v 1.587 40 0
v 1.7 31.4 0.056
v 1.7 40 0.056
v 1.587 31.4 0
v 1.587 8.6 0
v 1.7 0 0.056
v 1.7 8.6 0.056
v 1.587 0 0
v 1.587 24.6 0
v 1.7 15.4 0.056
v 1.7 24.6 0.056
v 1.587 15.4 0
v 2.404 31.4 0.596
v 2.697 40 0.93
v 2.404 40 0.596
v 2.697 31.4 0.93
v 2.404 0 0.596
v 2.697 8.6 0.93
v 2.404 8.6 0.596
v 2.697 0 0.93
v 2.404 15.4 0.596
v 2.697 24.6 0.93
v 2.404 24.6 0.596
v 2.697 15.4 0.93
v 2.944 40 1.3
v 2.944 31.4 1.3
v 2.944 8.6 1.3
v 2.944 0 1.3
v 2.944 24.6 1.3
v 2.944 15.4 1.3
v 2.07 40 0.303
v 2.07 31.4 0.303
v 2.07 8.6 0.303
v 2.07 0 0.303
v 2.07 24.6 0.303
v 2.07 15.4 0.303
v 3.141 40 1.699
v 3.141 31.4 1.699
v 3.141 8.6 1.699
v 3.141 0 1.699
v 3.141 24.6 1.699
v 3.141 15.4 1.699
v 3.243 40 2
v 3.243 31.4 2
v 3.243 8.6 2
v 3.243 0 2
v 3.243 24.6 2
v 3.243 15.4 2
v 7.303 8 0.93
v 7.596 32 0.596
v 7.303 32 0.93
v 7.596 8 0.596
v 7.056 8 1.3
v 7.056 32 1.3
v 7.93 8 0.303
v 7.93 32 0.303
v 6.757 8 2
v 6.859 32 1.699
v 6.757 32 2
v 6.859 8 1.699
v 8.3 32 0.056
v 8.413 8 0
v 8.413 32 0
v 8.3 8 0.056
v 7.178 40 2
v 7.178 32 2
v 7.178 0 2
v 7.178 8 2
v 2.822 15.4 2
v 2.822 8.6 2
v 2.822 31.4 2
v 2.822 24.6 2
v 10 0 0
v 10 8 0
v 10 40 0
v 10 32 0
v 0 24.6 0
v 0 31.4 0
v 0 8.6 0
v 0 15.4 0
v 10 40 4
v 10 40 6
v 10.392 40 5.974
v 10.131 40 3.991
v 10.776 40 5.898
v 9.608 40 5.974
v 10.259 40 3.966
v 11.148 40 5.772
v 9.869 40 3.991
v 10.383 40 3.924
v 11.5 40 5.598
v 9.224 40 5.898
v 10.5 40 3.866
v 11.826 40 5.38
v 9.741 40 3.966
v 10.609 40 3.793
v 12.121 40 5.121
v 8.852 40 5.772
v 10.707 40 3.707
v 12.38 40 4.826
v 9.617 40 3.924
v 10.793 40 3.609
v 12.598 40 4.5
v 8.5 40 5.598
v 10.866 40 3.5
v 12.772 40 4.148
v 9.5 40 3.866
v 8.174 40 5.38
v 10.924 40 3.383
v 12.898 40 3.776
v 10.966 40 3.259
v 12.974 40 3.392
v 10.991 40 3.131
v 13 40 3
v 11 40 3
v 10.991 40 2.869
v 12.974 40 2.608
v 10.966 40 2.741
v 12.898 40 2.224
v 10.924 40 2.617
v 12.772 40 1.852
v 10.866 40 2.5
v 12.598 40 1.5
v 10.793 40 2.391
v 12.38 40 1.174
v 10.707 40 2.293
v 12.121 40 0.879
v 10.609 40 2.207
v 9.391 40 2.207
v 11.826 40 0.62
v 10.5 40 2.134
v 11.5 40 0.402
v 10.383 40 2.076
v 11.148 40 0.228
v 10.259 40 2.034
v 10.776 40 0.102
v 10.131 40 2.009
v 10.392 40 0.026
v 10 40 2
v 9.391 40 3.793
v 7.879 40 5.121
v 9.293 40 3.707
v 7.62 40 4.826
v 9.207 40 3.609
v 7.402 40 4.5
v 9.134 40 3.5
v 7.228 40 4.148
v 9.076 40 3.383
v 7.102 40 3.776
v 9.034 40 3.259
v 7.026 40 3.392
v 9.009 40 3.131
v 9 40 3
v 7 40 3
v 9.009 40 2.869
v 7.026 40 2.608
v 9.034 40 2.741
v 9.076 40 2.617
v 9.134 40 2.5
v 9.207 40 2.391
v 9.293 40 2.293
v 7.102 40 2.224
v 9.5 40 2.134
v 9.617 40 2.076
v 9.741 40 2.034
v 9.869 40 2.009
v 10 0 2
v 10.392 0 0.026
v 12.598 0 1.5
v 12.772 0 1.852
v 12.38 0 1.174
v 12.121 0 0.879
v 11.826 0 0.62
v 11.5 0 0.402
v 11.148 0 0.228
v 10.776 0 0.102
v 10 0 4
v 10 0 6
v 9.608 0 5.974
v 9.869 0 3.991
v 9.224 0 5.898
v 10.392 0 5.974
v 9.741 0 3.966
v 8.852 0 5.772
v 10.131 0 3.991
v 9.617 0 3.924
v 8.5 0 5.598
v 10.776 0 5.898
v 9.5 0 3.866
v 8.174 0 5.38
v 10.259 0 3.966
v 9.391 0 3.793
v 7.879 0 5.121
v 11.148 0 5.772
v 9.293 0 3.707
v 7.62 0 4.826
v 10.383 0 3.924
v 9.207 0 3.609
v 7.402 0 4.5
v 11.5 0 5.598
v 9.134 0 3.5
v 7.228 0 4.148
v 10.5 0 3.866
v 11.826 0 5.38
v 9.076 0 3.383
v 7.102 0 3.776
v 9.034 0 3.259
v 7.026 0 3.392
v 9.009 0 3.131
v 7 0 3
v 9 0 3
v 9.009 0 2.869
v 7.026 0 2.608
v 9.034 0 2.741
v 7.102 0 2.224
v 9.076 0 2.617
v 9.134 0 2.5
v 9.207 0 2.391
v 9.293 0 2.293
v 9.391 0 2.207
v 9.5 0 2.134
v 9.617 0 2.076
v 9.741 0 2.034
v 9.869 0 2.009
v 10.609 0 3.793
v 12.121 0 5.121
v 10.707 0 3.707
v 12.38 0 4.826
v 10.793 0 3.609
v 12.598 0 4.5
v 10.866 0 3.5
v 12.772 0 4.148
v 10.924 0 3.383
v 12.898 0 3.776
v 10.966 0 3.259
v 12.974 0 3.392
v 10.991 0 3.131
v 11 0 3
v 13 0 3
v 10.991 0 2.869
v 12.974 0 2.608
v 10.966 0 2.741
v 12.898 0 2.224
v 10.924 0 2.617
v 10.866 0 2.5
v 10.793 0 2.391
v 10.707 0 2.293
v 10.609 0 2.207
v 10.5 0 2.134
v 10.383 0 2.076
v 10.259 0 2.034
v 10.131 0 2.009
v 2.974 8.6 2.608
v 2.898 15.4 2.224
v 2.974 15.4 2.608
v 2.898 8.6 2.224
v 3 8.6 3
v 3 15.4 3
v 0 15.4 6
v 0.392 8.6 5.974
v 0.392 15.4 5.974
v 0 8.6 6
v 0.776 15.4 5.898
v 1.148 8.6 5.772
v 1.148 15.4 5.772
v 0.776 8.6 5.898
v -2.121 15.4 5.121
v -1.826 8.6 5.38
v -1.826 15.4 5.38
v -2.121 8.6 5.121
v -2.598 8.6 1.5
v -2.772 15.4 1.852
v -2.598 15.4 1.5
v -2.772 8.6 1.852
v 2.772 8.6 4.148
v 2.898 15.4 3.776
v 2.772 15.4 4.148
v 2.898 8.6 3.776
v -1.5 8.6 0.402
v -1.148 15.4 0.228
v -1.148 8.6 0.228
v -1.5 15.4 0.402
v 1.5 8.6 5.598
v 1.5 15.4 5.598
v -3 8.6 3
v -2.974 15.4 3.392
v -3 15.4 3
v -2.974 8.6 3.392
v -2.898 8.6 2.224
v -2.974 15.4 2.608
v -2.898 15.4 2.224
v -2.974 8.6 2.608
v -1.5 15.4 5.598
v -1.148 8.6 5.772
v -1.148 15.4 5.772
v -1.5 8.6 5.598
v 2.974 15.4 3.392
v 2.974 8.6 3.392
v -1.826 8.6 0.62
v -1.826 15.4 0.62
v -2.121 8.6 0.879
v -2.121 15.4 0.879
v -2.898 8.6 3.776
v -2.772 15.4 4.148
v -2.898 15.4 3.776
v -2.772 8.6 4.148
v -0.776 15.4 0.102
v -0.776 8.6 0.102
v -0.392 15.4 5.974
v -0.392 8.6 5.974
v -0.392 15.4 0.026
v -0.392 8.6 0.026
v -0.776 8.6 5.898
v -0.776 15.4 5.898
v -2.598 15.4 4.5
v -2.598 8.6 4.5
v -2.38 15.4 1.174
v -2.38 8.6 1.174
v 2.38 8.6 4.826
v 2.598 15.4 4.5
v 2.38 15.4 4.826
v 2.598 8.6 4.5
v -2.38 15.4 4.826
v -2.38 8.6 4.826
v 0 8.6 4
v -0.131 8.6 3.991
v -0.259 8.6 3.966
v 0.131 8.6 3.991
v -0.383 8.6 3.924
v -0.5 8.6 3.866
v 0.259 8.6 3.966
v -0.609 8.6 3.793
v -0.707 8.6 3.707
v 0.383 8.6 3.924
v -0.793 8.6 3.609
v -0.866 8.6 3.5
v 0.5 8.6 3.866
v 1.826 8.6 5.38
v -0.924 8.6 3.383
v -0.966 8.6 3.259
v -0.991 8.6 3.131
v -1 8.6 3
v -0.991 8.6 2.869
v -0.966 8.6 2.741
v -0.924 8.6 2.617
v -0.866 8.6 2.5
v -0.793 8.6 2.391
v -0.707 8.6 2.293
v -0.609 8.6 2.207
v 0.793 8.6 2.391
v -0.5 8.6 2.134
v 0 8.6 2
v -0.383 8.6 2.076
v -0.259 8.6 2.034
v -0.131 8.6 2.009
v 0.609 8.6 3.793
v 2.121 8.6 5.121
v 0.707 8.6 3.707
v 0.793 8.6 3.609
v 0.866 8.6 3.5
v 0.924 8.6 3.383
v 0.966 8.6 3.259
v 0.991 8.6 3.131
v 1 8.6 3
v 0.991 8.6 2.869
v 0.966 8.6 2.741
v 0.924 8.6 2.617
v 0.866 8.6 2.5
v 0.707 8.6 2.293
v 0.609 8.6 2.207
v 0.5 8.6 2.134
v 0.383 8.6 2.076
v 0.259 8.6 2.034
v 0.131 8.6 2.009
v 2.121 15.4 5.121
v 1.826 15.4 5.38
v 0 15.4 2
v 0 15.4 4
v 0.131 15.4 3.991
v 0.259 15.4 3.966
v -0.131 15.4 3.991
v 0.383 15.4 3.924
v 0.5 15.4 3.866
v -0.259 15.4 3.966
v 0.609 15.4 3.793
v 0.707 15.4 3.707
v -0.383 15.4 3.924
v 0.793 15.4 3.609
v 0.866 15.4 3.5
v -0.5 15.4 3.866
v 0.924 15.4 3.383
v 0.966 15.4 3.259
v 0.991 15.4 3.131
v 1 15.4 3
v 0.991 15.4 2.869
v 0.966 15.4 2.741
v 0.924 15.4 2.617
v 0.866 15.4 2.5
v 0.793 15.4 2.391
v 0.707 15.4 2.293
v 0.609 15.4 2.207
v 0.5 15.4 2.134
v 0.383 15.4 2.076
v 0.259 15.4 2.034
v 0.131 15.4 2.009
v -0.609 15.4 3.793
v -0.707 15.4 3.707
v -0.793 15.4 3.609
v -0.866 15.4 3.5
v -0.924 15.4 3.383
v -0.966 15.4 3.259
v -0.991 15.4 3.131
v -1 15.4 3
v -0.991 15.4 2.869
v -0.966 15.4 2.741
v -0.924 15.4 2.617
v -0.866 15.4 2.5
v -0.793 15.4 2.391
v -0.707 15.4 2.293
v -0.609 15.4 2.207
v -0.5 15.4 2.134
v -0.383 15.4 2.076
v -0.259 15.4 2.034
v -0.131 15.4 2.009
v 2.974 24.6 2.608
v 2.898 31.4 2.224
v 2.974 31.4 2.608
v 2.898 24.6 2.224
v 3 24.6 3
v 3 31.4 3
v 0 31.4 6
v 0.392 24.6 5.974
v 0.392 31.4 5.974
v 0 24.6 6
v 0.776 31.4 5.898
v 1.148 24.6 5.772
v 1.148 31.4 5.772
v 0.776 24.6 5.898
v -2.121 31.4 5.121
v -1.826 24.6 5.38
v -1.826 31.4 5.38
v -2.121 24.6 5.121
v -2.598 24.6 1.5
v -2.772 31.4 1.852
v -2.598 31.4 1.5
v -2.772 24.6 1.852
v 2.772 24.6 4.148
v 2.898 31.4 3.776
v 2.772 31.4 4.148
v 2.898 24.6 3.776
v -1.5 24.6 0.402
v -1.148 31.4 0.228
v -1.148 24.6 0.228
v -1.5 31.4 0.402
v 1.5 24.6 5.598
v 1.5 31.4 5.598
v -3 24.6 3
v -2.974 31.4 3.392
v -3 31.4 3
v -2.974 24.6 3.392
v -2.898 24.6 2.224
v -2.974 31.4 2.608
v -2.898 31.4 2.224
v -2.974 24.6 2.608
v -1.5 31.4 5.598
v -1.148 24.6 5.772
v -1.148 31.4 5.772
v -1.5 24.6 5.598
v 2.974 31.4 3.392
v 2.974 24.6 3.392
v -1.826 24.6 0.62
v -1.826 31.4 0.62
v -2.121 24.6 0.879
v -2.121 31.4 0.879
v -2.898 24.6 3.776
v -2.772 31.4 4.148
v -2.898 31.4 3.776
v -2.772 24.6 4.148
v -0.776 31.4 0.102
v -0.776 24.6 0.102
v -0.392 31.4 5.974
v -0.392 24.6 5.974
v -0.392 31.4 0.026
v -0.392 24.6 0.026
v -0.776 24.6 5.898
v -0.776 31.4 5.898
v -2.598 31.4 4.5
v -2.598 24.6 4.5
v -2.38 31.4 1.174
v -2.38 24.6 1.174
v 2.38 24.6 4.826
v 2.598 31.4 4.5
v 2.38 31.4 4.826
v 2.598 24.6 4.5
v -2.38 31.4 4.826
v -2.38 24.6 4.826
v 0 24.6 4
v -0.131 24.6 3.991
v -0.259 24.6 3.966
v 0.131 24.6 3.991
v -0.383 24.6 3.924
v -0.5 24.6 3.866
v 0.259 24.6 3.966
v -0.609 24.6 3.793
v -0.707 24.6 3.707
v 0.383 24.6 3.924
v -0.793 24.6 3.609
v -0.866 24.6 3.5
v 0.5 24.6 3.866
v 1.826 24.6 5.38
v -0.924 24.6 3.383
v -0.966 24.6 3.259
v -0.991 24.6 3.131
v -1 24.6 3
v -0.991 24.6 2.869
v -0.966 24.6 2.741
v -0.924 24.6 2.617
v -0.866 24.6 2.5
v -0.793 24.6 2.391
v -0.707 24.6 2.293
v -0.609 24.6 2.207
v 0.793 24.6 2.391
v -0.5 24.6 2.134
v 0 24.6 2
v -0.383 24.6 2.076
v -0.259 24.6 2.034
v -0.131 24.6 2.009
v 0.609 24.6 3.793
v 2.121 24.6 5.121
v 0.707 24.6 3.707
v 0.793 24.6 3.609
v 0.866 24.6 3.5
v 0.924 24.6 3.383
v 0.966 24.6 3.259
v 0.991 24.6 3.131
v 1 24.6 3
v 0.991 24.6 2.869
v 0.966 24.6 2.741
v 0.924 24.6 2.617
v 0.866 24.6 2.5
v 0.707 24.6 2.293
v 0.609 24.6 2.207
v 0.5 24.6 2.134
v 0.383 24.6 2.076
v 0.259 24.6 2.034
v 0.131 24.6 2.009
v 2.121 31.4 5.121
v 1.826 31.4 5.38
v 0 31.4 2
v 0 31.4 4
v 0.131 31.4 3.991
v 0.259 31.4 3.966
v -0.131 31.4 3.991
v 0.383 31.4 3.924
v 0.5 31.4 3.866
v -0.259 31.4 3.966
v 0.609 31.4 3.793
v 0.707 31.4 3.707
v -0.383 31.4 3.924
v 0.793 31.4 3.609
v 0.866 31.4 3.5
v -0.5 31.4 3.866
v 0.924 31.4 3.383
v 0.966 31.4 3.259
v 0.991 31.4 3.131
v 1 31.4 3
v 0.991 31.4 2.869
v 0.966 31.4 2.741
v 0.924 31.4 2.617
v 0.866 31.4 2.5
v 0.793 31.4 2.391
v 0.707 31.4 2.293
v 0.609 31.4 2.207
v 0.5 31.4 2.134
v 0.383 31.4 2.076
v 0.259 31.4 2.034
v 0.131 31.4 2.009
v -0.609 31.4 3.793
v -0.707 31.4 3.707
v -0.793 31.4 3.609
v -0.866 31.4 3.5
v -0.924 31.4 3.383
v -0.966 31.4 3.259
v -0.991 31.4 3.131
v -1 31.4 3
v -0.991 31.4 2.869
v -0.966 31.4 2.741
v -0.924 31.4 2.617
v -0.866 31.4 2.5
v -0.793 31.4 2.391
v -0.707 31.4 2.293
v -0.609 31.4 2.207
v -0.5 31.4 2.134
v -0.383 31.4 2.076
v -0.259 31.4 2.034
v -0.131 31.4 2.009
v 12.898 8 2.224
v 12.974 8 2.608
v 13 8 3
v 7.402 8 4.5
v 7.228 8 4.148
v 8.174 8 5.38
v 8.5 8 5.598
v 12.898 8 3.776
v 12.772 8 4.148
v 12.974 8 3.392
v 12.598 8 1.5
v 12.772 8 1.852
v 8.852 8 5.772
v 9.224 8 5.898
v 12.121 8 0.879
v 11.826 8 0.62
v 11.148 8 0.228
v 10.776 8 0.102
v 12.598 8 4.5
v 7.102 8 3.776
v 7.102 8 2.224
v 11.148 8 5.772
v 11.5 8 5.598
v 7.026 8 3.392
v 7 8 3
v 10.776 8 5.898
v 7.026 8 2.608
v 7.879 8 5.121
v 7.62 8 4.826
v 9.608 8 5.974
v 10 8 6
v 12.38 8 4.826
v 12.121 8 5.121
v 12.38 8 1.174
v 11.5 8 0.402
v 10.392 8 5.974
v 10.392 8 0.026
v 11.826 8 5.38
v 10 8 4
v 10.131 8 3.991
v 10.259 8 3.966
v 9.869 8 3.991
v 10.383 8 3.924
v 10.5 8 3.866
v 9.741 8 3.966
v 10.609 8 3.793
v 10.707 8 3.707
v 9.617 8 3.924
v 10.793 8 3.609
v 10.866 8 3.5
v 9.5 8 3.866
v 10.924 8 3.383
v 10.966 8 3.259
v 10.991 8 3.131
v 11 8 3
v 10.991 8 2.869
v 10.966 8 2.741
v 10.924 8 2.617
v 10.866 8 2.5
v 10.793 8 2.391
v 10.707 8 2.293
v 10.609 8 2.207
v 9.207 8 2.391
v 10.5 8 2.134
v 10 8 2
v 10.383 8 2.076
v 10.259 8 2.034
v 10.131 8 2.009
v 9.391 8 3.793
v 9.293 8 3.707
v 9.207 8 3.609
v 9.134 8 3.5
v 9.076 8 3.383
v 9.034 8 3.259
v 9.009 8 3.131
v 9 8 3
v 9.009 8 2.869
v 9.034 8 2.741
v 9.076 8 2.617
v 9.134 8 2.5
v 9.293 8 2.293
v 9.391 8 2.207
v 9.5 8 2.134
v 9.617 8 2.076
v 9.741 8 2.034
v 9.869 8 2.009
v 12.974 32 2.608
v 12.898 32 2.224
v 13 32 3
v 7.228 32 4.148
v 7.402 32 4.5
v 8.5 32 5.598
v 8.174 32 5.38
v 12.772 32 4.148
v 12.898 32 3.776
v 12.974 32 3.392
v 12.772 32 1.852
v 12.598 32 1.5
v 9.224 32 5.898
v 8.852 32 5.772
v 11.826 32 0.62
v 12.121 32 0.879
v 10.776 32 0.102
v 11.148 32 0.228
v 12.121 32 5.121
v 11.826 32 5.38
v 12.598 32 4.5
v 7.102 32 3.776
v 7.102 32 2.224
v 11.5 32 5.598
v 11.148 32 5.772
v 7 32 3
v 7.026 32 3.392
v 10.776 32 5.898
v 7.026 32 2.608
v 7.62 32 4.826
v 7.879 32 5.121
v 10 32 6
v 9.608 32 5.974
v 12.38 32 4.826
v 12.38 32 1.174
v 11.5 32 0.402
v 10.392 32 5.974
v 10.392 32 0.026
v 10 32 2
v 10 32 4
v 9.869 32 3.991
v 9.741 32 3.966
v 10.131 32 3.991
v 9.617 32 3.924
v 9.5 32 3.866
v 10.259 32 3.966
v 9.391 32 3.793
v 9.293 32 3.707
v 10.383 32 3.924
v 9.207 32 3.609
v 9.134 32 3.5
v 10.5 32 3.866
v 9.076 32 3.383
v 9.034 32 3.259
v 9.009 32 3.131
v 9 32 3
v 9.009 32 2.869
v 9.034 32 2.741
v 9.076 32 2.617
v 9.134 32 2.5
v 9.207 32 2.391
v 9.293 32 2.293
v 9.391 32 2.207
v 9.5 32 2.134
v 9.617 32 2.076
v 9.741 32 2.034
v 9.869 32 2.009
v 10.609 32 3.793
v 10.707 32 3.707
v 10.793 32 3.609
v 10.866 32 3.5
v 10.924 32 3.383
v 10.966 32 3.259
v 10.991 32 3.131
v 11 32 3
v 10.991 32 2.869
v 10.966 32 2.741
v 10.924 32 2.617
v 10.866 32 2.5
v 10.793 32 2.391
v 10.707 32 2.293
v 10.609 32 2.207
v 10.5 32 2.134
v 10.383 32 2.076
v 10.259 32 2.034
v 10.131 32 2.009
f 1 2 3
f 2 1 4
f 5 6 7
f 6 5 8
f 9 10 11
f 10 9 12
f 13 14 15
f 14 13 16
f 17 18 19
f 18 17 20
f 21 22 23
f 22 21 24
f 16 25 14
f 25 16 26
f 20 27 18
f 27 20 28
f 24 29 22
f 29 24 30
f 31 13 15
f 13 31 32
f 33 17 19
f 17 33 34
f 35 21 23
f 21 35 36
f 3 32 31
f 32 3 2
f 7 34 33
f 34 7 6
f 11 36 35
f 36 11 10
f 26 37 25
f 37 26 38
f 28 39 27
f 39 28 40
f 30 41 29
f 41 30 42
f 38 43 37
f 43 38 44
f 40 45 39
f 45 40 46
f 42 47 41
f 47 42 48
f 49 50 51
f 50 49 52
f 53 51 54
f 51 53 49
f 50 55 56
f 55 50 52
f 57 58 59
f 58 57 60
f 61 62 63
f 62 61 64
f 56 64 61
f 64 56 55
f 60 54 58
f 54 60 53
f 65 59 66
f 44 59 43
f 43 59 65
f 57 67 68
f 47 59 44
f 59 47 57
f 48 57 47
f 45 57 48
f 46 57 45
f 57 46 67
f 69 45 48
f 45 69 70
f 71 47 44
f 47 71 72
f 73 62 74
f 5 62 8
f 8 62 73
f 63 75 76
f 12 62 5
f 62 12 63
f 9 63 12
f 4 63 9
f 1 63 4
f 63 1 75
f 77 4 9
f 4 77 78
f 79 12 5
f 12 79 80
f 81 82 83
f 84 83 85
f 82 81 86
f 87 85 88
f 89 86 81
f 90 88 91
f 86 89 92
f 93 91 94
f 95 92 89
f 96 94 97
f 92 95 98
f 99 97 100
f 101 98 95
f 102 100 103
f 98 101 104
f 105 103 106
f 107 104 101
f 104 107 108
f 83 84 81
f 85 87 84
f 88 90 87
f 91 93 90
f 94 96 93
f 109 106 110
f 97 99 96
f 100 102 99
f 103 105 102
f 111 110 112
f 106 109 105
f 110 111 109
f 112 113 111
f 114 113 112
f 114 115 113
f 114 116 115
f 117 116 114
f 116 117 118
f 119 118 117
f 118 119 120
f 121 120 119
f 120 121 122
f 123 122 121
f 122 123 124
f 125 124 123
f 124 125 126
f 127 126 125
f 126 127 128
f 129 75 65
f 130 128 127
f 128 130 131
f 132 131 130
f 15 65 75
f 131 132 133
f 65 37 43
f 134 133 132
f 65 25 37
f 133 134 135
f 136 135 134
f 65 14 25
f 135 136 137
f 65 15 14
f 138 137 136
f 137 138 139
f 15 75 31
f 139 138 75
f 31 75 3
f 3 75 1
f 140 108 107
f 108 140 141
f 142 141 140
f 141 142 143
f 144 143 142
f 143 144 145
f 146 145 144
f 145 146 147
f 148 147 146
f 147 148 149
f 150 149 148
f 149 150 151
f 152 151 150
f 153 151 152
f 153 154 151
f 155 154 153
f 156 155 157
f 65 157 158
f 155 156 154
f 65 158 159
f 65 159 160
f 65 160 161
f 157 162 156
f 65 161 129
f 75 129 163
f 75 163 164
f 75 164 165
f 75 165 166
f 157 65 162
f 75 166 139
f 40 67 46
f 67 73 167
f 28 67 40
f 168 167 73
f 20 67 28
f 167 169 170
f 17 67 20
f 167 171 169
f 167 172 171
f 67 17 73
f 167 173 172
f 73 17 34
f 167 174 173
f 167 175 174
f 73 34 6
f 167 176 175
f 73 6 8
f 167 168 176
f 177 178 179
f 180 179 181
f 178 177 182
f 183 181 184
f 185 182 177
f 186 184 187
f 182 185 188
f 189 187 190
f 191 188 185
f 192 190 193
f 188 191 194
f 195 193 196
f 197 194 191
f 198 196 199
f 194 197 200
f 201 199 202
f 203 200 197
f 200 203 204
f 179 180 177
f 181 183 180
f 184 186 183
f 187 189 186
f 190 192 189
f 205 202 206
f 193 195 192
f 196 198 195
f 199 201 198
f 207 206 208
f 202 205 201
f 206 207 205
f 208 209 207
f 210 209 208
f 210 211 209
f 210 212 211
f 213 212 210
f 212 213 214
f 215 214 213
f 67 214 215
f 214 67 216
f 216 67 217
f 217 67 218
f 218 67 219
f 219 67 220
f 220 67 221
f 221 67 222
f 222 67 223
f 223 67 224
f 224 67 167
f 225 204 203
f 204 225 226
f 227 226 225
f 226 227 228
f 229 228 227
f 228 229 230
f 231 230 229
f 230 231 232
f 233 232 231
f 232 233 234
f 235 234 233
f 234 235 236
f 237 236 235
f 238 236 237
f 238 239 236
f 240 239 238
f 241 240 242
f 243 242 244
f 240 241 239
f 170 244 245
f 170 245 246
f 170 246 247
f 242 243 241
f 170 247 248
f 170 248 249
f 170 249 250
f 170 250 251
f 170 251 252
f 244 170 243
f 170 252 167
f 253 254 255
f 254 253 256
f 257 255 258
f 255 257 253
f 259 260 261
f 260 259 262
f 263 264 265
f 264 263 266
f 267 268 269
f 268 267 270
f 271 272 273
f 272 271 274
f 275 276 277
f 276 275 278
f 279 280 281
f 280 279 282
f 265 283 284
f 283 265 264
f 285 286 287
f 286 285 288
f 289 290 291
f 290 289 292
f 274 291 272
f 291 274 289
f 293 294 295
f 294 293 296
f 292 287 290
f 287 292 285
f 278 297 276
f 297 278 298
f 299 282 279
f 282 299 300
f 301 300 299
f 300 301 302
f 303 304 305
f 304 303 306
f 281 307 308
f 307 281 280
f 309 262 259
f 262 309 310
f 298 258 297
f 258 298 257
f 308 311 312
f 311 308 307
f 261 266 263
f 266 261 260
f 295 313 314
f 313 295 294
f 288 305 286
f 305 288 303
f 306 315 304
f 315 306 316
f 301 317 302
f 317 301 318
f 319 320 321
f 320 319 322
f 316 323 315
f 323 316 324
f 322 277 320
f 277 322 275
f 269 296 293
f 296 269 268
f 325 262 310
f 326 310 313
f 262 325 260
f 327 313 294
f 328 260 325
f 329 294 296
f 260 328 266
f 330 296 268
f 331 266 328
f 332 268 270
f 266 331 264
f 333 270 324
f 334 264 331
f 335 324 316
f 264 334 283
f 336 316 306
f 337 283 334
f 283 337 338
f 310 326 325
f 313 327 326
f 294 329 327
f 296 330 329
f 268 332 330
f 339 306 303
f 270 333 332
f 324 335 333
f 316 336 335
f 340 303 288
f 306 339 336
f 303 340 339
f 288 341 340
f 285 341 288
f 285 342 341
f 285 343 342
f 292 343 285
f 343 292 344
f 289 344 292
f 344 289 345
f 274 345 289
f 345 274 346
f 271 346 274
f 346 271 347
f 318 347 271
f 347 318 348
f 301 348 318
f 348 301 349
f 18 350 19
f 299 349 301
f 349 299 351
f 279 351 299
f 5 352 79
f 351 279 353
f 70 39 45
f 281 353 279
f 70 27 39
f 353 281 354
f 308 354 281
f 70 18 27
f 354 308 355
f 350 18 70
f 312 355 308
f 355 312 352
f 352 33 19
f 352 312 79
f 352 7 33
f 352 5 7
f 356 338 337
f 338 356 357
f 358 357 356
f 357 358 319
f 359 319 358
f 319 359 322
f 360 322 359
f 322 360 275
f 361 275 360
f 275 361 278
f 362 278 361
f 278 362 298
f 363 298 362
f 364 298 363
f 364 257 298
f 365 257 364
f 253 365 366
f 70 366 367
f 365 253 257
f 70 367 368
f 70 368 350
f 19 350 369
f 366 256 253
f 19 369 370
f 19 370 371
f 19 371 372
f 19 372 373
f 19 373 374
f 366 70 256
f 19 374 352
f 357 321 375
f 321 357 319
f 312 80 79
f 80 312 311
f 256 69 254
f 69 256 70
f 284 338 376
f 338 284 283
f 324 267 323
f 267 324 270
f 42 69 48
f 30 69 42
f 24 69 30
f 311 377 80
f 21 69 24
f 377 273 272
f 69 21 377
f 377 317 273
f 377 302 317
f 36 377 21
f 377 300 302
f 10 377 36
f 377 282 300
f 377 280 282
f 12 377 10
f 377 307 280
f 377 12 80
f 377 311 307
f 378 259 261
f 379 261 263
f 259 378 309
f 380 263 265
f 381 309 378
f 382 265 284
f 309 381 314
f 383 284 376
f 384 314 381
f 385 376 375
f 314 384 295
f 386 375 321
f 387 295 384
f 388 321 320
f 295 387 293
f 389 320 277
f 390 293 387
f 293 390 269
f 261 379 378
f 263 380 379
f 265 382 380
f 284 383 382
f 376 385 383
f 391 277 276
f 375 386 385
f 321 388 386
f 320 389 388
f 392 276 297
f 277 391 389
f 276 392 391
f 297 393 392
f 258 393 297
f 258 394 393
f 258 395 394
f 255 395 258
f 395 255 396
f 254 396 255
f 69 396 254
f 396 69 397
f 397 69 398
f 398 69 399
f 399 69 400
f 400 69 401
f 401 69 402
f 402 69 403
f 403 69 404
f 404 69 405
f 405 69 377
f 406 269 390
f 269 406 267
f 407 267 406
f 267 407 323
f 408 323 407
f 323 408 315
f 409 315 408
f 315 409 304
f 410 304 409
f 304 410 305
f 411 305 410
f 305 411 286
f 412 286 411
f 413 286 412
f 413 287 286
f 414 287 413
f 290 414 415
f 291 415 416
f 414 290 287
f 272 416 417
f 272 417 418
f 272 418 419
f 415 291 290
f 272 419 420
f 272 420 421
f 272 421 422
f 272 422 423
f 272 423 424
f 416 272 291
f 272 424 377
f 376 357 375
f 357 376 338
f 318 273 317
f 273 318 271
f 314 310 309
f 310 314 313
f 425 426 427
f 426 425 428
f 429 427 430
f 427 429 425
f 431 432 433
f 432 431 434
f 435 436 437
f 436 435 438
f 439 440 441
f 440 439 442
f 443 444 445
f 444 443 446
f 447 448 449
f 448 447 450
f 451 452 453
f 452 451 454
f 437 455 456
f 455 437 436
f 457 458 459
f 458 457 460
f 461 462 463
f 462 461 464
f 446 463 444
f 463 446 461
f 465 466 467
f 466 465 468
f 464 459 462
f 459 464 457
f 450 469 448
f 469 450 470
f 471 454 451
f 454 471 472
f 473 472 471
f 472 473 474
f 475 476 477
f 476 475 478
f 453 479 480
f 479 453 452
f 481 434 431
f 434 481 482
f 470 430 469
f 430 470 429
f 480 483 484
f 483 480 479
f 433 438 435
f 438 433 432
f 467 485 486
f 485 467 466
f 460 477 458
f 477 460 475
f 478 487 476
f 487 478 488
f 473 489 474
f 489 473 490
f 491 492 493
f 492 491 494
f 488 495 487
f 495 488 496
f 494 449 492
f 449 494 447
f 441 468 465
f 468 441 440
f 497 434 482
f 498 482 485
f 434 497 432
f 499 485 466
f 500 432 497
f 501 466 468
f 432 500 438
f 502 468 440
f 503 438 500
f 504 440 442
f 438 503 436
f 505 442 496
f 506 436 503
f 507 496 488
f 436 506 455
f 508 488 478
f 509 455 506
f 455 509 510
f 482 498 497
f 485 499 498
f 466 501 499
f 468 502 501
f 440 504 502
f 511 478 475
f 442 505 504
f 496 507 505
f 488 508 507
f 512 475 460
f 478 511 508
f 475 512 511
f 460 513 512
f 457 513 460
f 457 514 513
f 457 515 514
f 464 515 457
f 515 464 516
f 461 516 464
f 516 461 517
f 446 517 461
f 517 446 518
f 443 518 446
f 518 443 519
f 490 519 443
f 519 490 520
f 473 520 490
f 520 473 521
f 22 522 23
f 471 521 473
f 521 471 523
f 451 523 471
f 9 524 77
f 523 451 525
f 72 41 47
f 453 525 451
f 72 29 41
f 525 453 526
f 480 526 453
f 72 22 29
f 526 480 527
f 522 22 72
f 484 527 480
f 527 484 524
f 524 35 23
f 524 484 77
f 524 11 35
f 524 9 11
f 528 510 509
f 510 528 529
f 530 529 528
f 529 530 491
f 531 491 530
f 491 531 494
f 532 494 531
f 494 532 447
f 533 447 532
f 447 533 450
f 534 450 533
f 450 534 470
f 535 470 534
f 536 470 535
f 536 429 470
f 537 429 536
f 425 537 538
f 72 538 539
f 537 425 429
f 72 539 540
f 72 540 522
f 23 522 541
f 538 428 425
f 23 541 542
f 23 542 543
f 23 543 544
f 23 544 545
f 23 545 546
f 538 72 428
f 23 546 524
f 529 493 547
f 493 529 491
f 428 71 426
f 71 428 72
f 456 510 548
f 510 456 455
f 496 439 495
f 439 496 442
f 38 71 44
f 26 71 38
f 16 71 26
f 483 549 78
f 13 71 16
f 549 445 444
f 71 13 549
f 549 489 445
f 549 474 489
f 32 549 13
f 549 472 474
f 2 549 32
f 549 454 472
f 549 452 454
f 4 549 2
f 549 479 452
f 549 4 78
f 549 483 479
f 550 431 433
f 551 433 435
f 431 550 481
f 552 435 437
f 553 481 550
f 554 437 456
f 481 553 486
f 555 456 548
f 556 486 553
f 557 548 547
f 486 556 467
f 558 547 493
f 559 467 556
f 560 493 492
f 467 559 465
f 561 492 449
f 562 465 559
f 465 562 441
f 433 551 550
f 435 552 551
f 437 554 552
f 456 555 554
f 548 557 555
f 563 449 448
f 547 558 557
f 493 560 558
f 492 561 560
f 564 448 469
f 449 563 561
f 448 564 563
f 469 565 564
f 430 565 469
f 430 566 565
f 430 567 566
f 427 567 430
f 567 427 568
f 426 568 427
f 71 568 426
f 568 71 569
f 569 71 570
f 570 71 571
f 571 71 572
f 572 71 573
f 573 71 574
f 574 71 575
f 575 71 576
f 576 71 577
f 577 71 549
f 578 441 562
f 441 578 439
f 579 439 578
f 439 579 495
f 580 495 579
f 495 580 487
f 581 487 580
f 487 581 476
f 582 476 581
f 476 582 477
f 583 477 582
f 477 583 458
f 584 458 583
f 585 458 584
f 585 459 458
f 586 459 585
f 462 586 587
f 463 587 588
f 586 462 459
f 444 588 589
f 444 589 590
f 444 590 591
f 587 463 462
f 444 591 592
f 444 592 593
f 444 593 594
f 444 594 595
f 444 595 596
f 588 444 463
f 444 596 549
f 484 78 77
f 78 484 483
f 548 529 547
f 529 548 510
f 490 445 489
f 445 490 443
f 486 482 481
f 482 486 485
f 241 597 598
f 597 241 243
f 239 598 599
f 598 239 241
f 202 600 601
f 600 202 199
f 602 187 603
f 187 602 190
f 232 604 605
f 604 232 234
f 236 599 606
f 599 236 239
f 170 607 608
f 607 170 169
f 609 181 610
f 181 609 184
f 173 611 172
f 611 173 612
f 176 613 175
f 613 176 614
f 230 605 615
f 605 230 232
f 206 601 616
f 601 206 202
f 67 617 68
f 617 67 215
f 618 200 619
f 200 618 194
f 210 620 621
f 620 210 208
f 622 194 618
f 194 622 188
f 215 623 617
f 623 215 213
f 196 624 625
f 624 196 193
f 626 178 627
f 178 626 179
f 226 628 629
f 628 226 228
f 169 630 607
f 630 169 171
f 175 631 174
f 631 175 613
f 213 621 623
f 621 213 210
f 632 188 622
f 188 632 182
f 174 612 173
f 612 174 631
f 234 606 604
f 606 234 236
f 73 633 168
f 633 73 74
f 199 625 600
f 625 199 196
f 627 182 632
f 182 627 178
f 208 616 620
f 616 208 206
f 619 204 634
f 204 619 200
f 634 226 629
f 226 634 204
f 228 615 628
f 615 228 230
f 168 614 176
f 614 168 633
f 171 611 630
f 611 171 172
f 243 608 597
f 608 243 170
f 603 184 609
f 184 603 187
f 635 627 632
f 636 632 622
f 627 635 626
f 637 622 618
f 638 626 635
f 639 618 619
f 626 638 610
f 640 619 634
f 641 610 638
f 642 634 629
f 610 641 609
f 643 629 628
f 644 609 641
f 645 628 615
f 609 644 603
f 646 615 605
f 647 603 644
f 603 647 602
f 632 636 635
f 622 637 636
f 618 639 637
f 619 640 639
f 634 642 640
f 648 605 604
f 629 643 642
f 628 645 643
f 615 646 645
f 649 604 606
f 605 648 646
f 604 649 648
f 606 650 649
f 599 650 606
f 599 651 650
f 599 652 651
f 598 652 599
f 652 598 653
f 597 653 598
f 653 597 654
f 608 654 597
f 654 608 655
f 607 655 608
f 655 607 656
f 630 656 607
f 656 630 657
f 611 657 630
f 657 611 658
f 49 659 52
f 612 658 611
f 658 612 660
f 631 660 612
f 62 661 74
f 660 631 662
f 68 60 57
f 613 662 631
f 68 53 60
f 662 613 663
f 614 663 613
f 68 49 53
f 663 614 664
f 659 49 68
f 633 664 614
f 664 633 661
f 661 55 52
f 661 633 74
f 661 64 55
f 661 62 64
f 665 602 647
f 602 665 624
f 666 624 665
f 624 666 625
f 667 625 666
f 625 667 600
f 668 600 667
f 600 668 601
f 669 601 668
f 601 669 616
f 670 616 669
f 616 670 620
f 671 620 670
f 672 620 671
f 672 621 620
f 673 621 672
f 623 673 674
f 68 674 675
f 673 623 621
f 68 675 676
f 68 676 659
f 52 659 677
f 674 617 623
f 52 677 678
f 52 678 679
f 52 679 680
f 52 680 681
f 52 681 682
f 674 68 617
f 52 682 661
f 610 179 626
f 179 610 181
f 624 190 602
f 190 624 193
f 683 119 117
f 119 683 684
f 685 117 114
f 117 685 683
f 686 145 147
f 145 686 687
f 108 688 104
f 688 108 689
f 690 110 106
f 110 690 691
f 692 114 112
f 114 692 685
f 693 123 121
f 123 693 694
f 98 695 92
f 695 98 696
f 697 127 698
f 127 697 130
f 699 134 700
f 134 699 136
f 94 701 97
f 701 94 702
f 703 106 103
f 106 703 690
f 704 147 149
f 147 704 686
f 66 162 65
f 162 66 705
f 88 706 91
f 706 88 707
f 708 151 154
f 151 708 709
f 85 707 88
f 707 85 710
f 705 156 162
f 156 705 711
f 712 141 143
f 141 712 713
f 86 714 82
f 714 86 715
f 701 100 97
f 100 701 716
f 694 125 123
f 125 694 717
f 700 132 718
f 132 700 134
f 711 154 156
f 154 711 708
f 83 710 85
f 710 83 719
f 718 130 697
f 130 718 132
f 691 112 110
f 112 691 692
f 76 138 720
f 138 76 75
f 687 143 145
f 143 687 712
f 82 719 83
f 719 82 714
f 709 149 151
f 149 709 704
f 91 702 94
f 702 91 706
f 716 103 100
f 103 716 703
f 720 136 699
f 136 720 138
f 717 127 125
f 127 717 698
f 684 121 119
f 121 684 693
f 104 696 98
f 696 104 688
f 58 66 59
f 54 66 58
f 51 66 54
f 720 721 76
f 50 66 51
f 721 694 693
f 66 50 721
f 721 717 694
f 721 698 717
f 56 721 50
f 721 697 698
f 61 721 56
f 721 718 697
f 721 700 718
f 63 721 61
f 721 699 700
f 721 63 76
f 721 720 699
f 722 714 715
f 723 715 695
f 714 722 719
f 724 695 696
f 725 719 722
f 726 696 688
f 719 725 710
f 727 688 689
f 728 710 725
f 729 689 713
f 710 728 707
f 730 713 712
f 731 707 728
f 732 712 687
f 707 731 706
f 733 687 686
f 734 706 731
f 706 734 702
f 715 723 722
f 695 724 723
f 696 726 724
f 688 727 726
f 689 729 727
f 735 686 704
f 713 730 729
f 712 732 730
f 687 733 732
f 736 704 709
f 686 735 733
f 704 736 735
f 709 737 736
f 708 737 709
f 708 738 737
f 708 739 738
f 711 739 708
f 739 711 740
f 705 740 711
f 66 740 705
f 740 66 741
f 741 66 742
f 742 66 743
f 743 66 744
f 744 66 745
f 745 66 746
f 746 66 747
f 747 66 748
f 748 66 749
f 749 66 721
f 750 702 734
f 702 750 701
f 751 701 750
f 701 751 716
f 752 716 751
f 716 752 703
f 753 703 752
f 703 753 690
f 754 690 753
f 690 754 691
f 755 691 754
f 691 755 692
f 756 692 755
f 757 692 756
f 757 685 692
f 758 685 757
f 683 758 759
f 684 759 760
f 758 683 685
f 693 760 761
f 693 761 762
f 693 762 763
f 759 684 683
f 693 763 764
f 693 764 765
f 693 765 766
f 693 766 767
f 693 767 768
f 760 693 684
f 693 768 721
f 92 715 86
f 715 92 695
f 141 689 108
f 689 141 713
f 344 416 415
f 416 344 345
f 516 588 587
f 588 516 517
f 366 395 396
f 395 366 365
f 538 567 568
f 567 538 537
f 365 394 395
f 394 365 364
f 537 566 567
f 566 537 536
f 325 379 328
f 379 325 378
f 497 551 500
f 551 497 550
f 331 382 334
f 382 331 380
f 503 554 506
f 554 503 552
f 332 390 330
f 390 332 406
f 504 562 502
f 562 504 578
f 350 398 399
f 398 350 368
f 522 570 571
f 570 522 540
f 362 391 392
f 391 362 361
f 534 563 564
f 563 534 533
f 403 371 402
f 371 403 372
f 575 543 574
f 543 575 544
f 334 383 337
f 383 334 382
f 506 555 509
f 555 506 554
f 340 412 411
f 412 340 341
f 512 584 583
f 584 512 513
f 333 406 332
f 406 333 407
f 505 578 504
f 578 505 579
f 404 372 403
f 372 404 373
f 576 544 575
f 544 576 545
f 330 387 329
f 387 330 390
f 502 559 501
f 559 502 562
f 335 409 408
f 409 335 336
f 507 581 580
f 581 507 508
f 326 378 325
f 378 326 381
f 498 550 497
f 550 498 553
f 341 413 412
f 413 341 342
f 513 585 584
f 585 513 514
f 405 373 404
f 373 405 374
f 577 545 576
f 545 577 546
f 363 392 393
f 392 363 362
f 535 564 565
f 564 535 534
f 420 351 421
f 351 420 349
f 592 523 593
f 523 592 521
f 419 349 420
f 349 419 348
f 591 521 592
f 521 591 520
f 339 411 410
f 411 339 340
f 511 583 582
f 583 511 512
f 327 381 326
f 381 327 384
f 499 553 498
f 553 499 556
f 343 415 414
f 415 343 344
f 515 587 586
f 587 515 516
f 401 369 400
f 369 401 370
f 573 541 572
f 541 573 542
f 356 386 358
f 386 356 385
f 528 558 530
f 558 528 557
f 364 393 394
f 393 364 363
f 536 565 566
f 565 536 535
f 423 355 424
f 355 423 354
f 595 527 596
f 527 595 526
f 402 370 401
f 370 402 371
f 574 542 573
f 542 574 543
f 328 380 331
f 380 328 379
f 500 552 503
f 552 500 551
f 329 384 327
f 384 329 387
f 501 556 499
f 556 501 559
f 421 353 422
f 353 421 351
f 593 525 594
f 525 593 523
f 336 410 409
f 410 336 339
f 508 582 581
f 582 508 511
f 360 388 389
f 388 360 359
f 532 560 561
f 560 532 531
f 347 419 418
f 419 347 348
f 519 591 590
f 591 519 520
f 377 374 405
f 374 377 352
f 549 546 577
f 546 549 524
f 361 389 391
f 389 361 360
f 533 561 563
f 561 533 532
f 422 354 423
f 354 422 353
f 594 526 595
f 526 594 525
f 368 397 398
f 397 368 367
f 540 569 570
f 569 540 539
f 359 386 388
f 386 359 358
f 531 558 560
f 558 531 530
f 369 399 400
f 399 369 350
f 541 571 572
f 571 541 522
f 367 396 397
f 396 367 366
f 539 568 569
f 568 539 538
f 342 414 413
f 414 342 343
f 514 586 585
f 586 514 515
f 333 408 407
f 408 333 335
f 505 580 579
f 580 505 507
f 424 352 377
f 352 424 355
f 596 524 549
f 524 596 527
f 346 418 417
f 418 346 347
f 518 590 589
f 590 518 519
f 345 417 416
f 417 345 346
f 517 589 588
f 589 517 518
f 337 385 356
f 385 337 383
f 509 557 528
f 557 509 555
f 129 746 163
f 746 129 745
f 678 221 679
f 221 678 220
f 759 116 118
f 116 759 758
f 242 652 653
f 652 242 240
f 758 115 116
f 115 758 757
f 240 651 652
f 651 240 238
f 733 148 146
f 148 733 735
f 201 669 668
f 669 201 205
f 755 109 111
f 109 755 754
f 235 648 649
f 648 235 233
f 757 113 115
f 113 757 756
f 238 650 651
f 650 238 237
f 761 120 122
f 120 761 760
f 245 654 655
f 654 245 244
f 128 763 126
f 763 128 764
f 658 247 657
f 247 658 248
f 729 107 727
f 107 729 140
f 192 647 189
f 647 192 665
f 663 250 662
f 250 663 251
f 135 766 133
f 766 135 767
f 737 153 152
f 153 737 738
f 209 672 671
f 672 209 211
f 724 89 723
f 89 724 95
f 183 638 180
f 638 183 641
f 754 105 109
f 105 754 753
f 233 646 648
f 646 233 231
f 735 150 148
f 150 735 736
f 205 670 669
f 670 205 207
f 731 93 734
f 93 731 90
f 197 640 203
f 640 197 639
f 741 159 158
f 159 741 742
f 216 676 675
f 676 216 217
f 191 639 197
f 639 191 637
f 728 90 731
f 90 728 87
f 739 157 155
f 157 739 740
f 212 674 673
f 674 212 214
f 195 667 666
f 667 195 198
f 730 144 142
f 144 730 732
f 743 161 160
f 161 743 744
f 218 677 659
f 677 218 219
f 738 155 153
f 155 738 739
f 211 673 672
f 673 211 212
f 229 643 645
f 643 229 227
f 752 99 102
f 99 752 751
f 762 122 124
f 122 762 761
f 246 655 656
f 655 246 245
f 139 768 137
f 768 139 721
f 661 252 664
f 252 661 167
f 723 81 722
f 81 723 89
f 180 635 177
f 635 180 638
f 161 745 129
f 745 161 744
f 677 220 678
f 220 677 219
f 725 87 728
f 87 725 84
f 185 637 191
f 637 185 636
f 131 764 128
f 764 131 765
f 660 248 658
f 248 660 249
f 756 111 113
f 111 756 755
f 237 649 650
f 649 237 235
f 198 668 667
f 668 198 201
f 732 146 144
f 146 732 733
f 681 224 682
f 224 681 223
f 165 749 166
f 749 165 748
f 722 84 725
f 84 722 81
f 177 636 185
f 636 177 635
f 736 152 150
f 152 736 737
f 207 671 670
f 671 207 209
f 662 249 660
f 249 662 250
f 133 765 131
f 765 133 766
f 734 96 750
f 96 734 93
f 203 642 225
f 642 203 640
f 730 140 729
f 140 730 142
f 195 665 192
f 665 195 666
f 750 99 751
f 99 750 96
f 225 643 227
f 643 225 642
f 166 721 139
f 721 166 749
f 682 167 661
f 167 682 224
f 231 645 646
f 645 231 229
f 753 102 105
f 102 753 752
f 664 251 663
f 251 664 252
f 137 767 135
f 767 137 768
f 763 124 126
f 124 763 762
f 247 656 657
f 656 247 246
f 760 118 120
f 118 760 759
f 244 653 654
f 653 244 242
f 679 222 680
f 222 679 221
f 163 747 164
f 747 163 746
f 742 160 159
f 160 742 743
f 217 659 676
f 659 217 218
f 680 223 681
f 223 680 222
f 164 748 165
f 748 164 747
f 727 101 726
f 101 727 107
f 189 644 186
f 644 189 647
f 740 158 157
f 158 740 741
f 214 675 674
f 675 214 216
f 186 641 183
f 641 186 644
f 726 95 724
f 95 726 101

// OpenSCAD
// Banda transportadora impresa en 3D: eslabones, piñones, cama de deslizamiento y prueba de tolerancia.
// Proyecto ClasificadorIoT. Unidades en mm.
// Para exportar una pieza: cambia "pieza" y usa F6 + Exportar STL,
// o por consola: openscad -D 'pieza="eslabon"' -o eslabon.stl banda_eslabones.scad

pieza = "eslabon"; // "eslabon", "placa", "pinon", "cama", "prueba", "cadena3"

// ---------- Parámetros principales ----------
paso       = 10;    // distancia entre pasadores
ancho      = 40;    // ancho de la banda
espesor    = 2;     // espesor de la placa superior
r_bisagra  = 3;     // radio de cada bisagra (diámetro 6)
z_eje      = 3;     // altura del eje del pasador (bisagra a ras de la cara superior)
d_agujero  = 2.0;   // agujero para filamento de 1,75 mm (ajustar con la prueba: 1.9 / 2.0 / 2.1)
holgura    = 0.4;   // holgura entre piezas móviles
separacion = 0.6;   // separación entre bisagras vecinas en el ancho

// Zonas de bisagras en el ancho (eje Y)
zonas_delanteras = [[0, 8], [32, 40]];                                   // en x = paso
zonas_traseras   = [[8 + separacion, 16 - separacion], [24 + separacion, 32 - separacion]]; // en x = 0

// Piñón
dientes    = 10;
d_eje      = 8.2;   // eje de 8 mm (impreso queda algo más chico)
d_tornillo = 2.8;   // tornillo prisionero M3 autorroscante

// Cama de deslizamiento
largo_cama = 150;
ancho_cama = 36;

$fn = 48;

// ---------- Utilidades ----------
module cilindro_y(x, y0, y1, r, z = z_eje) {
    translate([x, y0, z]) rotate([-90, 0, 0]) cylinder(r = r, h = y1 - y0);
}

// ---------- Eslabón ----------
// Se imprime con la cara de transporte (z = 0) apoyada en la cama de la impresora.
module eslabon() {
    difference() {
        union() {
            // Placa central con holgura alrededor de ambos pasadores
            difference() {
                cube([paso, ancho, espesor]);
                for (x = [0, paso]) cilindro_y(x, -1, ancho + 1, r_bisagra + holgura);
            }
            // Bisagras traseras (x = 0) con su unión a la placa
            for (zn = zonas_traseras) {
                cilindro_y(0, zn[0], zn[1], r_bisagra);
                translate([0, zn[0], 0]) cube([r_bisagra + holgura + 0.2, zn[1] - zn[0], espesor]);
            }
            // Bisagras delanteras (x = paso) con su unión a la placa
            for (zn = zonas_delanteras) {
                cilindro_y(paso, zn[0], zn[1], r_bisagra);
                translate([paso - (r_bisagra + holgura + 0.2), zn[0], 0])
                    cube([r_bisagra + holgura + 0.2, zn[1] - zn[0], espesor]);
            }
        }
        // Agujeros de los pasadores
        for (x = [0, paso]) cilindro_y(x, -1, ancho + 1, d_agujero / 2, z_eje);
    }
}

// Placa de impresión: 4 columnas x 10 filas = 40 eslabones (cabe en 220 x 220 mm)
module placa() {
    for (i = [0 : 9], j = [0 : 3])
        translate([r_bisagra + 2 + i * 18, 2 + j * 44, 0]) eslabon();
}

// Tres eslabones encadenados (solo para visualizar el armado)
module cadena3() {
    for (i = [0 : 2]) translate([i * paso, 0, 0]) eslabon();
    color("orangered") for (i = [0 : 3]) cilindro_y(i * paso, 0, ancho, 1.75 / 2);
}

// ---------- Piñón ----------
// Las bisagras de la banda calzan en las ranuras como rodillos de una cadena.
r_paso   = paso / (2 * sin(180 / dientes));        // radio primitivo (~16,2 mm)
r_ranura = r_bisagra + 0.25;
r_ext    = r_paso * cos(180 / dientes) + (z_eje - espesor) - 0.5; // no toca la placa entre pasadores

module pinon() {
    difference() {
        cylinder(r = r_ext, h = ancho, $fn = 120);
        for (k = [0 : dientes - 1]) rotate([0, 0, k * 360 / dientes]) {
            translate([r_paso, 0, -1]) cylinder(r = r_ranura, h = ancho + 2);
            translate([r_paso + 1.6, 0, -1]) cylinder(r = r_ranura + 0.6, h = ancho + 2); // entrada suave
        }
        // Eje de 8 mm con chaflanes
        translate([0, 0, -1]) cylinder(d = d_eje, h = ancho + 2);
        translate([0, 0, -0.01]) cylinder(d1 = d_eje + 1.6, d2 = d_eje, h = 0.8);
        translate([0, 0, ancho - 0.79]) cylinder(d1 = d_eje, d2 = d_eje + 1.6, h = 0.8);
        // Tornillo prisionero M3 radial (entra por el fondo de una ranura)
        translate([0, 0, 6]) rotate([0, 90, 0]) cylinder(d = d_tornillo, h = r_paso + 2);
    }
}

// ---------- Cama de deslizamiento ----------
// Va bajo el tramo superior para que la banda no se combe. Se usan 3 tramos.
module cama() {
    difference() {
        hull() {
            cube([largo_cama, ancho_cama, 2]);
            translate([2, 0, 0]) cube([largo_cama - 4, ancho_cama, 3]);
        }
        for (x = [8, largo_cama - 8], y = [6, ancho_cama - 6])
            translate([x, y, -1]) cylinder(d = 3.4, h = 5);
    }
}

// ---------- Prueba de tolerancia ----------
// Tres agujeros de 1,9 / 2,0 / 2,1 mm (marcados con 1, 2 y 3 puntos).
// Elige el más chico por el que el filamento pase con presión suave y gire.
module prueba() {
    medidas = [1.9, 2.0, 2.1];
    difference() {
        cube([36, 10, 6]);
        for (i = [0 : 2]) cilindro_y(6 + i * 12, -1, 11, medidas[i] / 2, 3);
    }
    for (i = [0 : 2], k = [0 : i])
        translate([6 + i * 12 - 3 + k * 2.2, 1, 6]) cube([1.2, 1.2, 0.8]);
}

// ---------- Selección ----------
if (pieza == "eslabon") eslabon();
else if (pieza == "placa") placa();
else if (pieza == "pinon") pinon();
else if (pieza == "cama") cama();
else if (pieza == "prueba") prueba();
else if (pieza == "cadena3") cadena3();
